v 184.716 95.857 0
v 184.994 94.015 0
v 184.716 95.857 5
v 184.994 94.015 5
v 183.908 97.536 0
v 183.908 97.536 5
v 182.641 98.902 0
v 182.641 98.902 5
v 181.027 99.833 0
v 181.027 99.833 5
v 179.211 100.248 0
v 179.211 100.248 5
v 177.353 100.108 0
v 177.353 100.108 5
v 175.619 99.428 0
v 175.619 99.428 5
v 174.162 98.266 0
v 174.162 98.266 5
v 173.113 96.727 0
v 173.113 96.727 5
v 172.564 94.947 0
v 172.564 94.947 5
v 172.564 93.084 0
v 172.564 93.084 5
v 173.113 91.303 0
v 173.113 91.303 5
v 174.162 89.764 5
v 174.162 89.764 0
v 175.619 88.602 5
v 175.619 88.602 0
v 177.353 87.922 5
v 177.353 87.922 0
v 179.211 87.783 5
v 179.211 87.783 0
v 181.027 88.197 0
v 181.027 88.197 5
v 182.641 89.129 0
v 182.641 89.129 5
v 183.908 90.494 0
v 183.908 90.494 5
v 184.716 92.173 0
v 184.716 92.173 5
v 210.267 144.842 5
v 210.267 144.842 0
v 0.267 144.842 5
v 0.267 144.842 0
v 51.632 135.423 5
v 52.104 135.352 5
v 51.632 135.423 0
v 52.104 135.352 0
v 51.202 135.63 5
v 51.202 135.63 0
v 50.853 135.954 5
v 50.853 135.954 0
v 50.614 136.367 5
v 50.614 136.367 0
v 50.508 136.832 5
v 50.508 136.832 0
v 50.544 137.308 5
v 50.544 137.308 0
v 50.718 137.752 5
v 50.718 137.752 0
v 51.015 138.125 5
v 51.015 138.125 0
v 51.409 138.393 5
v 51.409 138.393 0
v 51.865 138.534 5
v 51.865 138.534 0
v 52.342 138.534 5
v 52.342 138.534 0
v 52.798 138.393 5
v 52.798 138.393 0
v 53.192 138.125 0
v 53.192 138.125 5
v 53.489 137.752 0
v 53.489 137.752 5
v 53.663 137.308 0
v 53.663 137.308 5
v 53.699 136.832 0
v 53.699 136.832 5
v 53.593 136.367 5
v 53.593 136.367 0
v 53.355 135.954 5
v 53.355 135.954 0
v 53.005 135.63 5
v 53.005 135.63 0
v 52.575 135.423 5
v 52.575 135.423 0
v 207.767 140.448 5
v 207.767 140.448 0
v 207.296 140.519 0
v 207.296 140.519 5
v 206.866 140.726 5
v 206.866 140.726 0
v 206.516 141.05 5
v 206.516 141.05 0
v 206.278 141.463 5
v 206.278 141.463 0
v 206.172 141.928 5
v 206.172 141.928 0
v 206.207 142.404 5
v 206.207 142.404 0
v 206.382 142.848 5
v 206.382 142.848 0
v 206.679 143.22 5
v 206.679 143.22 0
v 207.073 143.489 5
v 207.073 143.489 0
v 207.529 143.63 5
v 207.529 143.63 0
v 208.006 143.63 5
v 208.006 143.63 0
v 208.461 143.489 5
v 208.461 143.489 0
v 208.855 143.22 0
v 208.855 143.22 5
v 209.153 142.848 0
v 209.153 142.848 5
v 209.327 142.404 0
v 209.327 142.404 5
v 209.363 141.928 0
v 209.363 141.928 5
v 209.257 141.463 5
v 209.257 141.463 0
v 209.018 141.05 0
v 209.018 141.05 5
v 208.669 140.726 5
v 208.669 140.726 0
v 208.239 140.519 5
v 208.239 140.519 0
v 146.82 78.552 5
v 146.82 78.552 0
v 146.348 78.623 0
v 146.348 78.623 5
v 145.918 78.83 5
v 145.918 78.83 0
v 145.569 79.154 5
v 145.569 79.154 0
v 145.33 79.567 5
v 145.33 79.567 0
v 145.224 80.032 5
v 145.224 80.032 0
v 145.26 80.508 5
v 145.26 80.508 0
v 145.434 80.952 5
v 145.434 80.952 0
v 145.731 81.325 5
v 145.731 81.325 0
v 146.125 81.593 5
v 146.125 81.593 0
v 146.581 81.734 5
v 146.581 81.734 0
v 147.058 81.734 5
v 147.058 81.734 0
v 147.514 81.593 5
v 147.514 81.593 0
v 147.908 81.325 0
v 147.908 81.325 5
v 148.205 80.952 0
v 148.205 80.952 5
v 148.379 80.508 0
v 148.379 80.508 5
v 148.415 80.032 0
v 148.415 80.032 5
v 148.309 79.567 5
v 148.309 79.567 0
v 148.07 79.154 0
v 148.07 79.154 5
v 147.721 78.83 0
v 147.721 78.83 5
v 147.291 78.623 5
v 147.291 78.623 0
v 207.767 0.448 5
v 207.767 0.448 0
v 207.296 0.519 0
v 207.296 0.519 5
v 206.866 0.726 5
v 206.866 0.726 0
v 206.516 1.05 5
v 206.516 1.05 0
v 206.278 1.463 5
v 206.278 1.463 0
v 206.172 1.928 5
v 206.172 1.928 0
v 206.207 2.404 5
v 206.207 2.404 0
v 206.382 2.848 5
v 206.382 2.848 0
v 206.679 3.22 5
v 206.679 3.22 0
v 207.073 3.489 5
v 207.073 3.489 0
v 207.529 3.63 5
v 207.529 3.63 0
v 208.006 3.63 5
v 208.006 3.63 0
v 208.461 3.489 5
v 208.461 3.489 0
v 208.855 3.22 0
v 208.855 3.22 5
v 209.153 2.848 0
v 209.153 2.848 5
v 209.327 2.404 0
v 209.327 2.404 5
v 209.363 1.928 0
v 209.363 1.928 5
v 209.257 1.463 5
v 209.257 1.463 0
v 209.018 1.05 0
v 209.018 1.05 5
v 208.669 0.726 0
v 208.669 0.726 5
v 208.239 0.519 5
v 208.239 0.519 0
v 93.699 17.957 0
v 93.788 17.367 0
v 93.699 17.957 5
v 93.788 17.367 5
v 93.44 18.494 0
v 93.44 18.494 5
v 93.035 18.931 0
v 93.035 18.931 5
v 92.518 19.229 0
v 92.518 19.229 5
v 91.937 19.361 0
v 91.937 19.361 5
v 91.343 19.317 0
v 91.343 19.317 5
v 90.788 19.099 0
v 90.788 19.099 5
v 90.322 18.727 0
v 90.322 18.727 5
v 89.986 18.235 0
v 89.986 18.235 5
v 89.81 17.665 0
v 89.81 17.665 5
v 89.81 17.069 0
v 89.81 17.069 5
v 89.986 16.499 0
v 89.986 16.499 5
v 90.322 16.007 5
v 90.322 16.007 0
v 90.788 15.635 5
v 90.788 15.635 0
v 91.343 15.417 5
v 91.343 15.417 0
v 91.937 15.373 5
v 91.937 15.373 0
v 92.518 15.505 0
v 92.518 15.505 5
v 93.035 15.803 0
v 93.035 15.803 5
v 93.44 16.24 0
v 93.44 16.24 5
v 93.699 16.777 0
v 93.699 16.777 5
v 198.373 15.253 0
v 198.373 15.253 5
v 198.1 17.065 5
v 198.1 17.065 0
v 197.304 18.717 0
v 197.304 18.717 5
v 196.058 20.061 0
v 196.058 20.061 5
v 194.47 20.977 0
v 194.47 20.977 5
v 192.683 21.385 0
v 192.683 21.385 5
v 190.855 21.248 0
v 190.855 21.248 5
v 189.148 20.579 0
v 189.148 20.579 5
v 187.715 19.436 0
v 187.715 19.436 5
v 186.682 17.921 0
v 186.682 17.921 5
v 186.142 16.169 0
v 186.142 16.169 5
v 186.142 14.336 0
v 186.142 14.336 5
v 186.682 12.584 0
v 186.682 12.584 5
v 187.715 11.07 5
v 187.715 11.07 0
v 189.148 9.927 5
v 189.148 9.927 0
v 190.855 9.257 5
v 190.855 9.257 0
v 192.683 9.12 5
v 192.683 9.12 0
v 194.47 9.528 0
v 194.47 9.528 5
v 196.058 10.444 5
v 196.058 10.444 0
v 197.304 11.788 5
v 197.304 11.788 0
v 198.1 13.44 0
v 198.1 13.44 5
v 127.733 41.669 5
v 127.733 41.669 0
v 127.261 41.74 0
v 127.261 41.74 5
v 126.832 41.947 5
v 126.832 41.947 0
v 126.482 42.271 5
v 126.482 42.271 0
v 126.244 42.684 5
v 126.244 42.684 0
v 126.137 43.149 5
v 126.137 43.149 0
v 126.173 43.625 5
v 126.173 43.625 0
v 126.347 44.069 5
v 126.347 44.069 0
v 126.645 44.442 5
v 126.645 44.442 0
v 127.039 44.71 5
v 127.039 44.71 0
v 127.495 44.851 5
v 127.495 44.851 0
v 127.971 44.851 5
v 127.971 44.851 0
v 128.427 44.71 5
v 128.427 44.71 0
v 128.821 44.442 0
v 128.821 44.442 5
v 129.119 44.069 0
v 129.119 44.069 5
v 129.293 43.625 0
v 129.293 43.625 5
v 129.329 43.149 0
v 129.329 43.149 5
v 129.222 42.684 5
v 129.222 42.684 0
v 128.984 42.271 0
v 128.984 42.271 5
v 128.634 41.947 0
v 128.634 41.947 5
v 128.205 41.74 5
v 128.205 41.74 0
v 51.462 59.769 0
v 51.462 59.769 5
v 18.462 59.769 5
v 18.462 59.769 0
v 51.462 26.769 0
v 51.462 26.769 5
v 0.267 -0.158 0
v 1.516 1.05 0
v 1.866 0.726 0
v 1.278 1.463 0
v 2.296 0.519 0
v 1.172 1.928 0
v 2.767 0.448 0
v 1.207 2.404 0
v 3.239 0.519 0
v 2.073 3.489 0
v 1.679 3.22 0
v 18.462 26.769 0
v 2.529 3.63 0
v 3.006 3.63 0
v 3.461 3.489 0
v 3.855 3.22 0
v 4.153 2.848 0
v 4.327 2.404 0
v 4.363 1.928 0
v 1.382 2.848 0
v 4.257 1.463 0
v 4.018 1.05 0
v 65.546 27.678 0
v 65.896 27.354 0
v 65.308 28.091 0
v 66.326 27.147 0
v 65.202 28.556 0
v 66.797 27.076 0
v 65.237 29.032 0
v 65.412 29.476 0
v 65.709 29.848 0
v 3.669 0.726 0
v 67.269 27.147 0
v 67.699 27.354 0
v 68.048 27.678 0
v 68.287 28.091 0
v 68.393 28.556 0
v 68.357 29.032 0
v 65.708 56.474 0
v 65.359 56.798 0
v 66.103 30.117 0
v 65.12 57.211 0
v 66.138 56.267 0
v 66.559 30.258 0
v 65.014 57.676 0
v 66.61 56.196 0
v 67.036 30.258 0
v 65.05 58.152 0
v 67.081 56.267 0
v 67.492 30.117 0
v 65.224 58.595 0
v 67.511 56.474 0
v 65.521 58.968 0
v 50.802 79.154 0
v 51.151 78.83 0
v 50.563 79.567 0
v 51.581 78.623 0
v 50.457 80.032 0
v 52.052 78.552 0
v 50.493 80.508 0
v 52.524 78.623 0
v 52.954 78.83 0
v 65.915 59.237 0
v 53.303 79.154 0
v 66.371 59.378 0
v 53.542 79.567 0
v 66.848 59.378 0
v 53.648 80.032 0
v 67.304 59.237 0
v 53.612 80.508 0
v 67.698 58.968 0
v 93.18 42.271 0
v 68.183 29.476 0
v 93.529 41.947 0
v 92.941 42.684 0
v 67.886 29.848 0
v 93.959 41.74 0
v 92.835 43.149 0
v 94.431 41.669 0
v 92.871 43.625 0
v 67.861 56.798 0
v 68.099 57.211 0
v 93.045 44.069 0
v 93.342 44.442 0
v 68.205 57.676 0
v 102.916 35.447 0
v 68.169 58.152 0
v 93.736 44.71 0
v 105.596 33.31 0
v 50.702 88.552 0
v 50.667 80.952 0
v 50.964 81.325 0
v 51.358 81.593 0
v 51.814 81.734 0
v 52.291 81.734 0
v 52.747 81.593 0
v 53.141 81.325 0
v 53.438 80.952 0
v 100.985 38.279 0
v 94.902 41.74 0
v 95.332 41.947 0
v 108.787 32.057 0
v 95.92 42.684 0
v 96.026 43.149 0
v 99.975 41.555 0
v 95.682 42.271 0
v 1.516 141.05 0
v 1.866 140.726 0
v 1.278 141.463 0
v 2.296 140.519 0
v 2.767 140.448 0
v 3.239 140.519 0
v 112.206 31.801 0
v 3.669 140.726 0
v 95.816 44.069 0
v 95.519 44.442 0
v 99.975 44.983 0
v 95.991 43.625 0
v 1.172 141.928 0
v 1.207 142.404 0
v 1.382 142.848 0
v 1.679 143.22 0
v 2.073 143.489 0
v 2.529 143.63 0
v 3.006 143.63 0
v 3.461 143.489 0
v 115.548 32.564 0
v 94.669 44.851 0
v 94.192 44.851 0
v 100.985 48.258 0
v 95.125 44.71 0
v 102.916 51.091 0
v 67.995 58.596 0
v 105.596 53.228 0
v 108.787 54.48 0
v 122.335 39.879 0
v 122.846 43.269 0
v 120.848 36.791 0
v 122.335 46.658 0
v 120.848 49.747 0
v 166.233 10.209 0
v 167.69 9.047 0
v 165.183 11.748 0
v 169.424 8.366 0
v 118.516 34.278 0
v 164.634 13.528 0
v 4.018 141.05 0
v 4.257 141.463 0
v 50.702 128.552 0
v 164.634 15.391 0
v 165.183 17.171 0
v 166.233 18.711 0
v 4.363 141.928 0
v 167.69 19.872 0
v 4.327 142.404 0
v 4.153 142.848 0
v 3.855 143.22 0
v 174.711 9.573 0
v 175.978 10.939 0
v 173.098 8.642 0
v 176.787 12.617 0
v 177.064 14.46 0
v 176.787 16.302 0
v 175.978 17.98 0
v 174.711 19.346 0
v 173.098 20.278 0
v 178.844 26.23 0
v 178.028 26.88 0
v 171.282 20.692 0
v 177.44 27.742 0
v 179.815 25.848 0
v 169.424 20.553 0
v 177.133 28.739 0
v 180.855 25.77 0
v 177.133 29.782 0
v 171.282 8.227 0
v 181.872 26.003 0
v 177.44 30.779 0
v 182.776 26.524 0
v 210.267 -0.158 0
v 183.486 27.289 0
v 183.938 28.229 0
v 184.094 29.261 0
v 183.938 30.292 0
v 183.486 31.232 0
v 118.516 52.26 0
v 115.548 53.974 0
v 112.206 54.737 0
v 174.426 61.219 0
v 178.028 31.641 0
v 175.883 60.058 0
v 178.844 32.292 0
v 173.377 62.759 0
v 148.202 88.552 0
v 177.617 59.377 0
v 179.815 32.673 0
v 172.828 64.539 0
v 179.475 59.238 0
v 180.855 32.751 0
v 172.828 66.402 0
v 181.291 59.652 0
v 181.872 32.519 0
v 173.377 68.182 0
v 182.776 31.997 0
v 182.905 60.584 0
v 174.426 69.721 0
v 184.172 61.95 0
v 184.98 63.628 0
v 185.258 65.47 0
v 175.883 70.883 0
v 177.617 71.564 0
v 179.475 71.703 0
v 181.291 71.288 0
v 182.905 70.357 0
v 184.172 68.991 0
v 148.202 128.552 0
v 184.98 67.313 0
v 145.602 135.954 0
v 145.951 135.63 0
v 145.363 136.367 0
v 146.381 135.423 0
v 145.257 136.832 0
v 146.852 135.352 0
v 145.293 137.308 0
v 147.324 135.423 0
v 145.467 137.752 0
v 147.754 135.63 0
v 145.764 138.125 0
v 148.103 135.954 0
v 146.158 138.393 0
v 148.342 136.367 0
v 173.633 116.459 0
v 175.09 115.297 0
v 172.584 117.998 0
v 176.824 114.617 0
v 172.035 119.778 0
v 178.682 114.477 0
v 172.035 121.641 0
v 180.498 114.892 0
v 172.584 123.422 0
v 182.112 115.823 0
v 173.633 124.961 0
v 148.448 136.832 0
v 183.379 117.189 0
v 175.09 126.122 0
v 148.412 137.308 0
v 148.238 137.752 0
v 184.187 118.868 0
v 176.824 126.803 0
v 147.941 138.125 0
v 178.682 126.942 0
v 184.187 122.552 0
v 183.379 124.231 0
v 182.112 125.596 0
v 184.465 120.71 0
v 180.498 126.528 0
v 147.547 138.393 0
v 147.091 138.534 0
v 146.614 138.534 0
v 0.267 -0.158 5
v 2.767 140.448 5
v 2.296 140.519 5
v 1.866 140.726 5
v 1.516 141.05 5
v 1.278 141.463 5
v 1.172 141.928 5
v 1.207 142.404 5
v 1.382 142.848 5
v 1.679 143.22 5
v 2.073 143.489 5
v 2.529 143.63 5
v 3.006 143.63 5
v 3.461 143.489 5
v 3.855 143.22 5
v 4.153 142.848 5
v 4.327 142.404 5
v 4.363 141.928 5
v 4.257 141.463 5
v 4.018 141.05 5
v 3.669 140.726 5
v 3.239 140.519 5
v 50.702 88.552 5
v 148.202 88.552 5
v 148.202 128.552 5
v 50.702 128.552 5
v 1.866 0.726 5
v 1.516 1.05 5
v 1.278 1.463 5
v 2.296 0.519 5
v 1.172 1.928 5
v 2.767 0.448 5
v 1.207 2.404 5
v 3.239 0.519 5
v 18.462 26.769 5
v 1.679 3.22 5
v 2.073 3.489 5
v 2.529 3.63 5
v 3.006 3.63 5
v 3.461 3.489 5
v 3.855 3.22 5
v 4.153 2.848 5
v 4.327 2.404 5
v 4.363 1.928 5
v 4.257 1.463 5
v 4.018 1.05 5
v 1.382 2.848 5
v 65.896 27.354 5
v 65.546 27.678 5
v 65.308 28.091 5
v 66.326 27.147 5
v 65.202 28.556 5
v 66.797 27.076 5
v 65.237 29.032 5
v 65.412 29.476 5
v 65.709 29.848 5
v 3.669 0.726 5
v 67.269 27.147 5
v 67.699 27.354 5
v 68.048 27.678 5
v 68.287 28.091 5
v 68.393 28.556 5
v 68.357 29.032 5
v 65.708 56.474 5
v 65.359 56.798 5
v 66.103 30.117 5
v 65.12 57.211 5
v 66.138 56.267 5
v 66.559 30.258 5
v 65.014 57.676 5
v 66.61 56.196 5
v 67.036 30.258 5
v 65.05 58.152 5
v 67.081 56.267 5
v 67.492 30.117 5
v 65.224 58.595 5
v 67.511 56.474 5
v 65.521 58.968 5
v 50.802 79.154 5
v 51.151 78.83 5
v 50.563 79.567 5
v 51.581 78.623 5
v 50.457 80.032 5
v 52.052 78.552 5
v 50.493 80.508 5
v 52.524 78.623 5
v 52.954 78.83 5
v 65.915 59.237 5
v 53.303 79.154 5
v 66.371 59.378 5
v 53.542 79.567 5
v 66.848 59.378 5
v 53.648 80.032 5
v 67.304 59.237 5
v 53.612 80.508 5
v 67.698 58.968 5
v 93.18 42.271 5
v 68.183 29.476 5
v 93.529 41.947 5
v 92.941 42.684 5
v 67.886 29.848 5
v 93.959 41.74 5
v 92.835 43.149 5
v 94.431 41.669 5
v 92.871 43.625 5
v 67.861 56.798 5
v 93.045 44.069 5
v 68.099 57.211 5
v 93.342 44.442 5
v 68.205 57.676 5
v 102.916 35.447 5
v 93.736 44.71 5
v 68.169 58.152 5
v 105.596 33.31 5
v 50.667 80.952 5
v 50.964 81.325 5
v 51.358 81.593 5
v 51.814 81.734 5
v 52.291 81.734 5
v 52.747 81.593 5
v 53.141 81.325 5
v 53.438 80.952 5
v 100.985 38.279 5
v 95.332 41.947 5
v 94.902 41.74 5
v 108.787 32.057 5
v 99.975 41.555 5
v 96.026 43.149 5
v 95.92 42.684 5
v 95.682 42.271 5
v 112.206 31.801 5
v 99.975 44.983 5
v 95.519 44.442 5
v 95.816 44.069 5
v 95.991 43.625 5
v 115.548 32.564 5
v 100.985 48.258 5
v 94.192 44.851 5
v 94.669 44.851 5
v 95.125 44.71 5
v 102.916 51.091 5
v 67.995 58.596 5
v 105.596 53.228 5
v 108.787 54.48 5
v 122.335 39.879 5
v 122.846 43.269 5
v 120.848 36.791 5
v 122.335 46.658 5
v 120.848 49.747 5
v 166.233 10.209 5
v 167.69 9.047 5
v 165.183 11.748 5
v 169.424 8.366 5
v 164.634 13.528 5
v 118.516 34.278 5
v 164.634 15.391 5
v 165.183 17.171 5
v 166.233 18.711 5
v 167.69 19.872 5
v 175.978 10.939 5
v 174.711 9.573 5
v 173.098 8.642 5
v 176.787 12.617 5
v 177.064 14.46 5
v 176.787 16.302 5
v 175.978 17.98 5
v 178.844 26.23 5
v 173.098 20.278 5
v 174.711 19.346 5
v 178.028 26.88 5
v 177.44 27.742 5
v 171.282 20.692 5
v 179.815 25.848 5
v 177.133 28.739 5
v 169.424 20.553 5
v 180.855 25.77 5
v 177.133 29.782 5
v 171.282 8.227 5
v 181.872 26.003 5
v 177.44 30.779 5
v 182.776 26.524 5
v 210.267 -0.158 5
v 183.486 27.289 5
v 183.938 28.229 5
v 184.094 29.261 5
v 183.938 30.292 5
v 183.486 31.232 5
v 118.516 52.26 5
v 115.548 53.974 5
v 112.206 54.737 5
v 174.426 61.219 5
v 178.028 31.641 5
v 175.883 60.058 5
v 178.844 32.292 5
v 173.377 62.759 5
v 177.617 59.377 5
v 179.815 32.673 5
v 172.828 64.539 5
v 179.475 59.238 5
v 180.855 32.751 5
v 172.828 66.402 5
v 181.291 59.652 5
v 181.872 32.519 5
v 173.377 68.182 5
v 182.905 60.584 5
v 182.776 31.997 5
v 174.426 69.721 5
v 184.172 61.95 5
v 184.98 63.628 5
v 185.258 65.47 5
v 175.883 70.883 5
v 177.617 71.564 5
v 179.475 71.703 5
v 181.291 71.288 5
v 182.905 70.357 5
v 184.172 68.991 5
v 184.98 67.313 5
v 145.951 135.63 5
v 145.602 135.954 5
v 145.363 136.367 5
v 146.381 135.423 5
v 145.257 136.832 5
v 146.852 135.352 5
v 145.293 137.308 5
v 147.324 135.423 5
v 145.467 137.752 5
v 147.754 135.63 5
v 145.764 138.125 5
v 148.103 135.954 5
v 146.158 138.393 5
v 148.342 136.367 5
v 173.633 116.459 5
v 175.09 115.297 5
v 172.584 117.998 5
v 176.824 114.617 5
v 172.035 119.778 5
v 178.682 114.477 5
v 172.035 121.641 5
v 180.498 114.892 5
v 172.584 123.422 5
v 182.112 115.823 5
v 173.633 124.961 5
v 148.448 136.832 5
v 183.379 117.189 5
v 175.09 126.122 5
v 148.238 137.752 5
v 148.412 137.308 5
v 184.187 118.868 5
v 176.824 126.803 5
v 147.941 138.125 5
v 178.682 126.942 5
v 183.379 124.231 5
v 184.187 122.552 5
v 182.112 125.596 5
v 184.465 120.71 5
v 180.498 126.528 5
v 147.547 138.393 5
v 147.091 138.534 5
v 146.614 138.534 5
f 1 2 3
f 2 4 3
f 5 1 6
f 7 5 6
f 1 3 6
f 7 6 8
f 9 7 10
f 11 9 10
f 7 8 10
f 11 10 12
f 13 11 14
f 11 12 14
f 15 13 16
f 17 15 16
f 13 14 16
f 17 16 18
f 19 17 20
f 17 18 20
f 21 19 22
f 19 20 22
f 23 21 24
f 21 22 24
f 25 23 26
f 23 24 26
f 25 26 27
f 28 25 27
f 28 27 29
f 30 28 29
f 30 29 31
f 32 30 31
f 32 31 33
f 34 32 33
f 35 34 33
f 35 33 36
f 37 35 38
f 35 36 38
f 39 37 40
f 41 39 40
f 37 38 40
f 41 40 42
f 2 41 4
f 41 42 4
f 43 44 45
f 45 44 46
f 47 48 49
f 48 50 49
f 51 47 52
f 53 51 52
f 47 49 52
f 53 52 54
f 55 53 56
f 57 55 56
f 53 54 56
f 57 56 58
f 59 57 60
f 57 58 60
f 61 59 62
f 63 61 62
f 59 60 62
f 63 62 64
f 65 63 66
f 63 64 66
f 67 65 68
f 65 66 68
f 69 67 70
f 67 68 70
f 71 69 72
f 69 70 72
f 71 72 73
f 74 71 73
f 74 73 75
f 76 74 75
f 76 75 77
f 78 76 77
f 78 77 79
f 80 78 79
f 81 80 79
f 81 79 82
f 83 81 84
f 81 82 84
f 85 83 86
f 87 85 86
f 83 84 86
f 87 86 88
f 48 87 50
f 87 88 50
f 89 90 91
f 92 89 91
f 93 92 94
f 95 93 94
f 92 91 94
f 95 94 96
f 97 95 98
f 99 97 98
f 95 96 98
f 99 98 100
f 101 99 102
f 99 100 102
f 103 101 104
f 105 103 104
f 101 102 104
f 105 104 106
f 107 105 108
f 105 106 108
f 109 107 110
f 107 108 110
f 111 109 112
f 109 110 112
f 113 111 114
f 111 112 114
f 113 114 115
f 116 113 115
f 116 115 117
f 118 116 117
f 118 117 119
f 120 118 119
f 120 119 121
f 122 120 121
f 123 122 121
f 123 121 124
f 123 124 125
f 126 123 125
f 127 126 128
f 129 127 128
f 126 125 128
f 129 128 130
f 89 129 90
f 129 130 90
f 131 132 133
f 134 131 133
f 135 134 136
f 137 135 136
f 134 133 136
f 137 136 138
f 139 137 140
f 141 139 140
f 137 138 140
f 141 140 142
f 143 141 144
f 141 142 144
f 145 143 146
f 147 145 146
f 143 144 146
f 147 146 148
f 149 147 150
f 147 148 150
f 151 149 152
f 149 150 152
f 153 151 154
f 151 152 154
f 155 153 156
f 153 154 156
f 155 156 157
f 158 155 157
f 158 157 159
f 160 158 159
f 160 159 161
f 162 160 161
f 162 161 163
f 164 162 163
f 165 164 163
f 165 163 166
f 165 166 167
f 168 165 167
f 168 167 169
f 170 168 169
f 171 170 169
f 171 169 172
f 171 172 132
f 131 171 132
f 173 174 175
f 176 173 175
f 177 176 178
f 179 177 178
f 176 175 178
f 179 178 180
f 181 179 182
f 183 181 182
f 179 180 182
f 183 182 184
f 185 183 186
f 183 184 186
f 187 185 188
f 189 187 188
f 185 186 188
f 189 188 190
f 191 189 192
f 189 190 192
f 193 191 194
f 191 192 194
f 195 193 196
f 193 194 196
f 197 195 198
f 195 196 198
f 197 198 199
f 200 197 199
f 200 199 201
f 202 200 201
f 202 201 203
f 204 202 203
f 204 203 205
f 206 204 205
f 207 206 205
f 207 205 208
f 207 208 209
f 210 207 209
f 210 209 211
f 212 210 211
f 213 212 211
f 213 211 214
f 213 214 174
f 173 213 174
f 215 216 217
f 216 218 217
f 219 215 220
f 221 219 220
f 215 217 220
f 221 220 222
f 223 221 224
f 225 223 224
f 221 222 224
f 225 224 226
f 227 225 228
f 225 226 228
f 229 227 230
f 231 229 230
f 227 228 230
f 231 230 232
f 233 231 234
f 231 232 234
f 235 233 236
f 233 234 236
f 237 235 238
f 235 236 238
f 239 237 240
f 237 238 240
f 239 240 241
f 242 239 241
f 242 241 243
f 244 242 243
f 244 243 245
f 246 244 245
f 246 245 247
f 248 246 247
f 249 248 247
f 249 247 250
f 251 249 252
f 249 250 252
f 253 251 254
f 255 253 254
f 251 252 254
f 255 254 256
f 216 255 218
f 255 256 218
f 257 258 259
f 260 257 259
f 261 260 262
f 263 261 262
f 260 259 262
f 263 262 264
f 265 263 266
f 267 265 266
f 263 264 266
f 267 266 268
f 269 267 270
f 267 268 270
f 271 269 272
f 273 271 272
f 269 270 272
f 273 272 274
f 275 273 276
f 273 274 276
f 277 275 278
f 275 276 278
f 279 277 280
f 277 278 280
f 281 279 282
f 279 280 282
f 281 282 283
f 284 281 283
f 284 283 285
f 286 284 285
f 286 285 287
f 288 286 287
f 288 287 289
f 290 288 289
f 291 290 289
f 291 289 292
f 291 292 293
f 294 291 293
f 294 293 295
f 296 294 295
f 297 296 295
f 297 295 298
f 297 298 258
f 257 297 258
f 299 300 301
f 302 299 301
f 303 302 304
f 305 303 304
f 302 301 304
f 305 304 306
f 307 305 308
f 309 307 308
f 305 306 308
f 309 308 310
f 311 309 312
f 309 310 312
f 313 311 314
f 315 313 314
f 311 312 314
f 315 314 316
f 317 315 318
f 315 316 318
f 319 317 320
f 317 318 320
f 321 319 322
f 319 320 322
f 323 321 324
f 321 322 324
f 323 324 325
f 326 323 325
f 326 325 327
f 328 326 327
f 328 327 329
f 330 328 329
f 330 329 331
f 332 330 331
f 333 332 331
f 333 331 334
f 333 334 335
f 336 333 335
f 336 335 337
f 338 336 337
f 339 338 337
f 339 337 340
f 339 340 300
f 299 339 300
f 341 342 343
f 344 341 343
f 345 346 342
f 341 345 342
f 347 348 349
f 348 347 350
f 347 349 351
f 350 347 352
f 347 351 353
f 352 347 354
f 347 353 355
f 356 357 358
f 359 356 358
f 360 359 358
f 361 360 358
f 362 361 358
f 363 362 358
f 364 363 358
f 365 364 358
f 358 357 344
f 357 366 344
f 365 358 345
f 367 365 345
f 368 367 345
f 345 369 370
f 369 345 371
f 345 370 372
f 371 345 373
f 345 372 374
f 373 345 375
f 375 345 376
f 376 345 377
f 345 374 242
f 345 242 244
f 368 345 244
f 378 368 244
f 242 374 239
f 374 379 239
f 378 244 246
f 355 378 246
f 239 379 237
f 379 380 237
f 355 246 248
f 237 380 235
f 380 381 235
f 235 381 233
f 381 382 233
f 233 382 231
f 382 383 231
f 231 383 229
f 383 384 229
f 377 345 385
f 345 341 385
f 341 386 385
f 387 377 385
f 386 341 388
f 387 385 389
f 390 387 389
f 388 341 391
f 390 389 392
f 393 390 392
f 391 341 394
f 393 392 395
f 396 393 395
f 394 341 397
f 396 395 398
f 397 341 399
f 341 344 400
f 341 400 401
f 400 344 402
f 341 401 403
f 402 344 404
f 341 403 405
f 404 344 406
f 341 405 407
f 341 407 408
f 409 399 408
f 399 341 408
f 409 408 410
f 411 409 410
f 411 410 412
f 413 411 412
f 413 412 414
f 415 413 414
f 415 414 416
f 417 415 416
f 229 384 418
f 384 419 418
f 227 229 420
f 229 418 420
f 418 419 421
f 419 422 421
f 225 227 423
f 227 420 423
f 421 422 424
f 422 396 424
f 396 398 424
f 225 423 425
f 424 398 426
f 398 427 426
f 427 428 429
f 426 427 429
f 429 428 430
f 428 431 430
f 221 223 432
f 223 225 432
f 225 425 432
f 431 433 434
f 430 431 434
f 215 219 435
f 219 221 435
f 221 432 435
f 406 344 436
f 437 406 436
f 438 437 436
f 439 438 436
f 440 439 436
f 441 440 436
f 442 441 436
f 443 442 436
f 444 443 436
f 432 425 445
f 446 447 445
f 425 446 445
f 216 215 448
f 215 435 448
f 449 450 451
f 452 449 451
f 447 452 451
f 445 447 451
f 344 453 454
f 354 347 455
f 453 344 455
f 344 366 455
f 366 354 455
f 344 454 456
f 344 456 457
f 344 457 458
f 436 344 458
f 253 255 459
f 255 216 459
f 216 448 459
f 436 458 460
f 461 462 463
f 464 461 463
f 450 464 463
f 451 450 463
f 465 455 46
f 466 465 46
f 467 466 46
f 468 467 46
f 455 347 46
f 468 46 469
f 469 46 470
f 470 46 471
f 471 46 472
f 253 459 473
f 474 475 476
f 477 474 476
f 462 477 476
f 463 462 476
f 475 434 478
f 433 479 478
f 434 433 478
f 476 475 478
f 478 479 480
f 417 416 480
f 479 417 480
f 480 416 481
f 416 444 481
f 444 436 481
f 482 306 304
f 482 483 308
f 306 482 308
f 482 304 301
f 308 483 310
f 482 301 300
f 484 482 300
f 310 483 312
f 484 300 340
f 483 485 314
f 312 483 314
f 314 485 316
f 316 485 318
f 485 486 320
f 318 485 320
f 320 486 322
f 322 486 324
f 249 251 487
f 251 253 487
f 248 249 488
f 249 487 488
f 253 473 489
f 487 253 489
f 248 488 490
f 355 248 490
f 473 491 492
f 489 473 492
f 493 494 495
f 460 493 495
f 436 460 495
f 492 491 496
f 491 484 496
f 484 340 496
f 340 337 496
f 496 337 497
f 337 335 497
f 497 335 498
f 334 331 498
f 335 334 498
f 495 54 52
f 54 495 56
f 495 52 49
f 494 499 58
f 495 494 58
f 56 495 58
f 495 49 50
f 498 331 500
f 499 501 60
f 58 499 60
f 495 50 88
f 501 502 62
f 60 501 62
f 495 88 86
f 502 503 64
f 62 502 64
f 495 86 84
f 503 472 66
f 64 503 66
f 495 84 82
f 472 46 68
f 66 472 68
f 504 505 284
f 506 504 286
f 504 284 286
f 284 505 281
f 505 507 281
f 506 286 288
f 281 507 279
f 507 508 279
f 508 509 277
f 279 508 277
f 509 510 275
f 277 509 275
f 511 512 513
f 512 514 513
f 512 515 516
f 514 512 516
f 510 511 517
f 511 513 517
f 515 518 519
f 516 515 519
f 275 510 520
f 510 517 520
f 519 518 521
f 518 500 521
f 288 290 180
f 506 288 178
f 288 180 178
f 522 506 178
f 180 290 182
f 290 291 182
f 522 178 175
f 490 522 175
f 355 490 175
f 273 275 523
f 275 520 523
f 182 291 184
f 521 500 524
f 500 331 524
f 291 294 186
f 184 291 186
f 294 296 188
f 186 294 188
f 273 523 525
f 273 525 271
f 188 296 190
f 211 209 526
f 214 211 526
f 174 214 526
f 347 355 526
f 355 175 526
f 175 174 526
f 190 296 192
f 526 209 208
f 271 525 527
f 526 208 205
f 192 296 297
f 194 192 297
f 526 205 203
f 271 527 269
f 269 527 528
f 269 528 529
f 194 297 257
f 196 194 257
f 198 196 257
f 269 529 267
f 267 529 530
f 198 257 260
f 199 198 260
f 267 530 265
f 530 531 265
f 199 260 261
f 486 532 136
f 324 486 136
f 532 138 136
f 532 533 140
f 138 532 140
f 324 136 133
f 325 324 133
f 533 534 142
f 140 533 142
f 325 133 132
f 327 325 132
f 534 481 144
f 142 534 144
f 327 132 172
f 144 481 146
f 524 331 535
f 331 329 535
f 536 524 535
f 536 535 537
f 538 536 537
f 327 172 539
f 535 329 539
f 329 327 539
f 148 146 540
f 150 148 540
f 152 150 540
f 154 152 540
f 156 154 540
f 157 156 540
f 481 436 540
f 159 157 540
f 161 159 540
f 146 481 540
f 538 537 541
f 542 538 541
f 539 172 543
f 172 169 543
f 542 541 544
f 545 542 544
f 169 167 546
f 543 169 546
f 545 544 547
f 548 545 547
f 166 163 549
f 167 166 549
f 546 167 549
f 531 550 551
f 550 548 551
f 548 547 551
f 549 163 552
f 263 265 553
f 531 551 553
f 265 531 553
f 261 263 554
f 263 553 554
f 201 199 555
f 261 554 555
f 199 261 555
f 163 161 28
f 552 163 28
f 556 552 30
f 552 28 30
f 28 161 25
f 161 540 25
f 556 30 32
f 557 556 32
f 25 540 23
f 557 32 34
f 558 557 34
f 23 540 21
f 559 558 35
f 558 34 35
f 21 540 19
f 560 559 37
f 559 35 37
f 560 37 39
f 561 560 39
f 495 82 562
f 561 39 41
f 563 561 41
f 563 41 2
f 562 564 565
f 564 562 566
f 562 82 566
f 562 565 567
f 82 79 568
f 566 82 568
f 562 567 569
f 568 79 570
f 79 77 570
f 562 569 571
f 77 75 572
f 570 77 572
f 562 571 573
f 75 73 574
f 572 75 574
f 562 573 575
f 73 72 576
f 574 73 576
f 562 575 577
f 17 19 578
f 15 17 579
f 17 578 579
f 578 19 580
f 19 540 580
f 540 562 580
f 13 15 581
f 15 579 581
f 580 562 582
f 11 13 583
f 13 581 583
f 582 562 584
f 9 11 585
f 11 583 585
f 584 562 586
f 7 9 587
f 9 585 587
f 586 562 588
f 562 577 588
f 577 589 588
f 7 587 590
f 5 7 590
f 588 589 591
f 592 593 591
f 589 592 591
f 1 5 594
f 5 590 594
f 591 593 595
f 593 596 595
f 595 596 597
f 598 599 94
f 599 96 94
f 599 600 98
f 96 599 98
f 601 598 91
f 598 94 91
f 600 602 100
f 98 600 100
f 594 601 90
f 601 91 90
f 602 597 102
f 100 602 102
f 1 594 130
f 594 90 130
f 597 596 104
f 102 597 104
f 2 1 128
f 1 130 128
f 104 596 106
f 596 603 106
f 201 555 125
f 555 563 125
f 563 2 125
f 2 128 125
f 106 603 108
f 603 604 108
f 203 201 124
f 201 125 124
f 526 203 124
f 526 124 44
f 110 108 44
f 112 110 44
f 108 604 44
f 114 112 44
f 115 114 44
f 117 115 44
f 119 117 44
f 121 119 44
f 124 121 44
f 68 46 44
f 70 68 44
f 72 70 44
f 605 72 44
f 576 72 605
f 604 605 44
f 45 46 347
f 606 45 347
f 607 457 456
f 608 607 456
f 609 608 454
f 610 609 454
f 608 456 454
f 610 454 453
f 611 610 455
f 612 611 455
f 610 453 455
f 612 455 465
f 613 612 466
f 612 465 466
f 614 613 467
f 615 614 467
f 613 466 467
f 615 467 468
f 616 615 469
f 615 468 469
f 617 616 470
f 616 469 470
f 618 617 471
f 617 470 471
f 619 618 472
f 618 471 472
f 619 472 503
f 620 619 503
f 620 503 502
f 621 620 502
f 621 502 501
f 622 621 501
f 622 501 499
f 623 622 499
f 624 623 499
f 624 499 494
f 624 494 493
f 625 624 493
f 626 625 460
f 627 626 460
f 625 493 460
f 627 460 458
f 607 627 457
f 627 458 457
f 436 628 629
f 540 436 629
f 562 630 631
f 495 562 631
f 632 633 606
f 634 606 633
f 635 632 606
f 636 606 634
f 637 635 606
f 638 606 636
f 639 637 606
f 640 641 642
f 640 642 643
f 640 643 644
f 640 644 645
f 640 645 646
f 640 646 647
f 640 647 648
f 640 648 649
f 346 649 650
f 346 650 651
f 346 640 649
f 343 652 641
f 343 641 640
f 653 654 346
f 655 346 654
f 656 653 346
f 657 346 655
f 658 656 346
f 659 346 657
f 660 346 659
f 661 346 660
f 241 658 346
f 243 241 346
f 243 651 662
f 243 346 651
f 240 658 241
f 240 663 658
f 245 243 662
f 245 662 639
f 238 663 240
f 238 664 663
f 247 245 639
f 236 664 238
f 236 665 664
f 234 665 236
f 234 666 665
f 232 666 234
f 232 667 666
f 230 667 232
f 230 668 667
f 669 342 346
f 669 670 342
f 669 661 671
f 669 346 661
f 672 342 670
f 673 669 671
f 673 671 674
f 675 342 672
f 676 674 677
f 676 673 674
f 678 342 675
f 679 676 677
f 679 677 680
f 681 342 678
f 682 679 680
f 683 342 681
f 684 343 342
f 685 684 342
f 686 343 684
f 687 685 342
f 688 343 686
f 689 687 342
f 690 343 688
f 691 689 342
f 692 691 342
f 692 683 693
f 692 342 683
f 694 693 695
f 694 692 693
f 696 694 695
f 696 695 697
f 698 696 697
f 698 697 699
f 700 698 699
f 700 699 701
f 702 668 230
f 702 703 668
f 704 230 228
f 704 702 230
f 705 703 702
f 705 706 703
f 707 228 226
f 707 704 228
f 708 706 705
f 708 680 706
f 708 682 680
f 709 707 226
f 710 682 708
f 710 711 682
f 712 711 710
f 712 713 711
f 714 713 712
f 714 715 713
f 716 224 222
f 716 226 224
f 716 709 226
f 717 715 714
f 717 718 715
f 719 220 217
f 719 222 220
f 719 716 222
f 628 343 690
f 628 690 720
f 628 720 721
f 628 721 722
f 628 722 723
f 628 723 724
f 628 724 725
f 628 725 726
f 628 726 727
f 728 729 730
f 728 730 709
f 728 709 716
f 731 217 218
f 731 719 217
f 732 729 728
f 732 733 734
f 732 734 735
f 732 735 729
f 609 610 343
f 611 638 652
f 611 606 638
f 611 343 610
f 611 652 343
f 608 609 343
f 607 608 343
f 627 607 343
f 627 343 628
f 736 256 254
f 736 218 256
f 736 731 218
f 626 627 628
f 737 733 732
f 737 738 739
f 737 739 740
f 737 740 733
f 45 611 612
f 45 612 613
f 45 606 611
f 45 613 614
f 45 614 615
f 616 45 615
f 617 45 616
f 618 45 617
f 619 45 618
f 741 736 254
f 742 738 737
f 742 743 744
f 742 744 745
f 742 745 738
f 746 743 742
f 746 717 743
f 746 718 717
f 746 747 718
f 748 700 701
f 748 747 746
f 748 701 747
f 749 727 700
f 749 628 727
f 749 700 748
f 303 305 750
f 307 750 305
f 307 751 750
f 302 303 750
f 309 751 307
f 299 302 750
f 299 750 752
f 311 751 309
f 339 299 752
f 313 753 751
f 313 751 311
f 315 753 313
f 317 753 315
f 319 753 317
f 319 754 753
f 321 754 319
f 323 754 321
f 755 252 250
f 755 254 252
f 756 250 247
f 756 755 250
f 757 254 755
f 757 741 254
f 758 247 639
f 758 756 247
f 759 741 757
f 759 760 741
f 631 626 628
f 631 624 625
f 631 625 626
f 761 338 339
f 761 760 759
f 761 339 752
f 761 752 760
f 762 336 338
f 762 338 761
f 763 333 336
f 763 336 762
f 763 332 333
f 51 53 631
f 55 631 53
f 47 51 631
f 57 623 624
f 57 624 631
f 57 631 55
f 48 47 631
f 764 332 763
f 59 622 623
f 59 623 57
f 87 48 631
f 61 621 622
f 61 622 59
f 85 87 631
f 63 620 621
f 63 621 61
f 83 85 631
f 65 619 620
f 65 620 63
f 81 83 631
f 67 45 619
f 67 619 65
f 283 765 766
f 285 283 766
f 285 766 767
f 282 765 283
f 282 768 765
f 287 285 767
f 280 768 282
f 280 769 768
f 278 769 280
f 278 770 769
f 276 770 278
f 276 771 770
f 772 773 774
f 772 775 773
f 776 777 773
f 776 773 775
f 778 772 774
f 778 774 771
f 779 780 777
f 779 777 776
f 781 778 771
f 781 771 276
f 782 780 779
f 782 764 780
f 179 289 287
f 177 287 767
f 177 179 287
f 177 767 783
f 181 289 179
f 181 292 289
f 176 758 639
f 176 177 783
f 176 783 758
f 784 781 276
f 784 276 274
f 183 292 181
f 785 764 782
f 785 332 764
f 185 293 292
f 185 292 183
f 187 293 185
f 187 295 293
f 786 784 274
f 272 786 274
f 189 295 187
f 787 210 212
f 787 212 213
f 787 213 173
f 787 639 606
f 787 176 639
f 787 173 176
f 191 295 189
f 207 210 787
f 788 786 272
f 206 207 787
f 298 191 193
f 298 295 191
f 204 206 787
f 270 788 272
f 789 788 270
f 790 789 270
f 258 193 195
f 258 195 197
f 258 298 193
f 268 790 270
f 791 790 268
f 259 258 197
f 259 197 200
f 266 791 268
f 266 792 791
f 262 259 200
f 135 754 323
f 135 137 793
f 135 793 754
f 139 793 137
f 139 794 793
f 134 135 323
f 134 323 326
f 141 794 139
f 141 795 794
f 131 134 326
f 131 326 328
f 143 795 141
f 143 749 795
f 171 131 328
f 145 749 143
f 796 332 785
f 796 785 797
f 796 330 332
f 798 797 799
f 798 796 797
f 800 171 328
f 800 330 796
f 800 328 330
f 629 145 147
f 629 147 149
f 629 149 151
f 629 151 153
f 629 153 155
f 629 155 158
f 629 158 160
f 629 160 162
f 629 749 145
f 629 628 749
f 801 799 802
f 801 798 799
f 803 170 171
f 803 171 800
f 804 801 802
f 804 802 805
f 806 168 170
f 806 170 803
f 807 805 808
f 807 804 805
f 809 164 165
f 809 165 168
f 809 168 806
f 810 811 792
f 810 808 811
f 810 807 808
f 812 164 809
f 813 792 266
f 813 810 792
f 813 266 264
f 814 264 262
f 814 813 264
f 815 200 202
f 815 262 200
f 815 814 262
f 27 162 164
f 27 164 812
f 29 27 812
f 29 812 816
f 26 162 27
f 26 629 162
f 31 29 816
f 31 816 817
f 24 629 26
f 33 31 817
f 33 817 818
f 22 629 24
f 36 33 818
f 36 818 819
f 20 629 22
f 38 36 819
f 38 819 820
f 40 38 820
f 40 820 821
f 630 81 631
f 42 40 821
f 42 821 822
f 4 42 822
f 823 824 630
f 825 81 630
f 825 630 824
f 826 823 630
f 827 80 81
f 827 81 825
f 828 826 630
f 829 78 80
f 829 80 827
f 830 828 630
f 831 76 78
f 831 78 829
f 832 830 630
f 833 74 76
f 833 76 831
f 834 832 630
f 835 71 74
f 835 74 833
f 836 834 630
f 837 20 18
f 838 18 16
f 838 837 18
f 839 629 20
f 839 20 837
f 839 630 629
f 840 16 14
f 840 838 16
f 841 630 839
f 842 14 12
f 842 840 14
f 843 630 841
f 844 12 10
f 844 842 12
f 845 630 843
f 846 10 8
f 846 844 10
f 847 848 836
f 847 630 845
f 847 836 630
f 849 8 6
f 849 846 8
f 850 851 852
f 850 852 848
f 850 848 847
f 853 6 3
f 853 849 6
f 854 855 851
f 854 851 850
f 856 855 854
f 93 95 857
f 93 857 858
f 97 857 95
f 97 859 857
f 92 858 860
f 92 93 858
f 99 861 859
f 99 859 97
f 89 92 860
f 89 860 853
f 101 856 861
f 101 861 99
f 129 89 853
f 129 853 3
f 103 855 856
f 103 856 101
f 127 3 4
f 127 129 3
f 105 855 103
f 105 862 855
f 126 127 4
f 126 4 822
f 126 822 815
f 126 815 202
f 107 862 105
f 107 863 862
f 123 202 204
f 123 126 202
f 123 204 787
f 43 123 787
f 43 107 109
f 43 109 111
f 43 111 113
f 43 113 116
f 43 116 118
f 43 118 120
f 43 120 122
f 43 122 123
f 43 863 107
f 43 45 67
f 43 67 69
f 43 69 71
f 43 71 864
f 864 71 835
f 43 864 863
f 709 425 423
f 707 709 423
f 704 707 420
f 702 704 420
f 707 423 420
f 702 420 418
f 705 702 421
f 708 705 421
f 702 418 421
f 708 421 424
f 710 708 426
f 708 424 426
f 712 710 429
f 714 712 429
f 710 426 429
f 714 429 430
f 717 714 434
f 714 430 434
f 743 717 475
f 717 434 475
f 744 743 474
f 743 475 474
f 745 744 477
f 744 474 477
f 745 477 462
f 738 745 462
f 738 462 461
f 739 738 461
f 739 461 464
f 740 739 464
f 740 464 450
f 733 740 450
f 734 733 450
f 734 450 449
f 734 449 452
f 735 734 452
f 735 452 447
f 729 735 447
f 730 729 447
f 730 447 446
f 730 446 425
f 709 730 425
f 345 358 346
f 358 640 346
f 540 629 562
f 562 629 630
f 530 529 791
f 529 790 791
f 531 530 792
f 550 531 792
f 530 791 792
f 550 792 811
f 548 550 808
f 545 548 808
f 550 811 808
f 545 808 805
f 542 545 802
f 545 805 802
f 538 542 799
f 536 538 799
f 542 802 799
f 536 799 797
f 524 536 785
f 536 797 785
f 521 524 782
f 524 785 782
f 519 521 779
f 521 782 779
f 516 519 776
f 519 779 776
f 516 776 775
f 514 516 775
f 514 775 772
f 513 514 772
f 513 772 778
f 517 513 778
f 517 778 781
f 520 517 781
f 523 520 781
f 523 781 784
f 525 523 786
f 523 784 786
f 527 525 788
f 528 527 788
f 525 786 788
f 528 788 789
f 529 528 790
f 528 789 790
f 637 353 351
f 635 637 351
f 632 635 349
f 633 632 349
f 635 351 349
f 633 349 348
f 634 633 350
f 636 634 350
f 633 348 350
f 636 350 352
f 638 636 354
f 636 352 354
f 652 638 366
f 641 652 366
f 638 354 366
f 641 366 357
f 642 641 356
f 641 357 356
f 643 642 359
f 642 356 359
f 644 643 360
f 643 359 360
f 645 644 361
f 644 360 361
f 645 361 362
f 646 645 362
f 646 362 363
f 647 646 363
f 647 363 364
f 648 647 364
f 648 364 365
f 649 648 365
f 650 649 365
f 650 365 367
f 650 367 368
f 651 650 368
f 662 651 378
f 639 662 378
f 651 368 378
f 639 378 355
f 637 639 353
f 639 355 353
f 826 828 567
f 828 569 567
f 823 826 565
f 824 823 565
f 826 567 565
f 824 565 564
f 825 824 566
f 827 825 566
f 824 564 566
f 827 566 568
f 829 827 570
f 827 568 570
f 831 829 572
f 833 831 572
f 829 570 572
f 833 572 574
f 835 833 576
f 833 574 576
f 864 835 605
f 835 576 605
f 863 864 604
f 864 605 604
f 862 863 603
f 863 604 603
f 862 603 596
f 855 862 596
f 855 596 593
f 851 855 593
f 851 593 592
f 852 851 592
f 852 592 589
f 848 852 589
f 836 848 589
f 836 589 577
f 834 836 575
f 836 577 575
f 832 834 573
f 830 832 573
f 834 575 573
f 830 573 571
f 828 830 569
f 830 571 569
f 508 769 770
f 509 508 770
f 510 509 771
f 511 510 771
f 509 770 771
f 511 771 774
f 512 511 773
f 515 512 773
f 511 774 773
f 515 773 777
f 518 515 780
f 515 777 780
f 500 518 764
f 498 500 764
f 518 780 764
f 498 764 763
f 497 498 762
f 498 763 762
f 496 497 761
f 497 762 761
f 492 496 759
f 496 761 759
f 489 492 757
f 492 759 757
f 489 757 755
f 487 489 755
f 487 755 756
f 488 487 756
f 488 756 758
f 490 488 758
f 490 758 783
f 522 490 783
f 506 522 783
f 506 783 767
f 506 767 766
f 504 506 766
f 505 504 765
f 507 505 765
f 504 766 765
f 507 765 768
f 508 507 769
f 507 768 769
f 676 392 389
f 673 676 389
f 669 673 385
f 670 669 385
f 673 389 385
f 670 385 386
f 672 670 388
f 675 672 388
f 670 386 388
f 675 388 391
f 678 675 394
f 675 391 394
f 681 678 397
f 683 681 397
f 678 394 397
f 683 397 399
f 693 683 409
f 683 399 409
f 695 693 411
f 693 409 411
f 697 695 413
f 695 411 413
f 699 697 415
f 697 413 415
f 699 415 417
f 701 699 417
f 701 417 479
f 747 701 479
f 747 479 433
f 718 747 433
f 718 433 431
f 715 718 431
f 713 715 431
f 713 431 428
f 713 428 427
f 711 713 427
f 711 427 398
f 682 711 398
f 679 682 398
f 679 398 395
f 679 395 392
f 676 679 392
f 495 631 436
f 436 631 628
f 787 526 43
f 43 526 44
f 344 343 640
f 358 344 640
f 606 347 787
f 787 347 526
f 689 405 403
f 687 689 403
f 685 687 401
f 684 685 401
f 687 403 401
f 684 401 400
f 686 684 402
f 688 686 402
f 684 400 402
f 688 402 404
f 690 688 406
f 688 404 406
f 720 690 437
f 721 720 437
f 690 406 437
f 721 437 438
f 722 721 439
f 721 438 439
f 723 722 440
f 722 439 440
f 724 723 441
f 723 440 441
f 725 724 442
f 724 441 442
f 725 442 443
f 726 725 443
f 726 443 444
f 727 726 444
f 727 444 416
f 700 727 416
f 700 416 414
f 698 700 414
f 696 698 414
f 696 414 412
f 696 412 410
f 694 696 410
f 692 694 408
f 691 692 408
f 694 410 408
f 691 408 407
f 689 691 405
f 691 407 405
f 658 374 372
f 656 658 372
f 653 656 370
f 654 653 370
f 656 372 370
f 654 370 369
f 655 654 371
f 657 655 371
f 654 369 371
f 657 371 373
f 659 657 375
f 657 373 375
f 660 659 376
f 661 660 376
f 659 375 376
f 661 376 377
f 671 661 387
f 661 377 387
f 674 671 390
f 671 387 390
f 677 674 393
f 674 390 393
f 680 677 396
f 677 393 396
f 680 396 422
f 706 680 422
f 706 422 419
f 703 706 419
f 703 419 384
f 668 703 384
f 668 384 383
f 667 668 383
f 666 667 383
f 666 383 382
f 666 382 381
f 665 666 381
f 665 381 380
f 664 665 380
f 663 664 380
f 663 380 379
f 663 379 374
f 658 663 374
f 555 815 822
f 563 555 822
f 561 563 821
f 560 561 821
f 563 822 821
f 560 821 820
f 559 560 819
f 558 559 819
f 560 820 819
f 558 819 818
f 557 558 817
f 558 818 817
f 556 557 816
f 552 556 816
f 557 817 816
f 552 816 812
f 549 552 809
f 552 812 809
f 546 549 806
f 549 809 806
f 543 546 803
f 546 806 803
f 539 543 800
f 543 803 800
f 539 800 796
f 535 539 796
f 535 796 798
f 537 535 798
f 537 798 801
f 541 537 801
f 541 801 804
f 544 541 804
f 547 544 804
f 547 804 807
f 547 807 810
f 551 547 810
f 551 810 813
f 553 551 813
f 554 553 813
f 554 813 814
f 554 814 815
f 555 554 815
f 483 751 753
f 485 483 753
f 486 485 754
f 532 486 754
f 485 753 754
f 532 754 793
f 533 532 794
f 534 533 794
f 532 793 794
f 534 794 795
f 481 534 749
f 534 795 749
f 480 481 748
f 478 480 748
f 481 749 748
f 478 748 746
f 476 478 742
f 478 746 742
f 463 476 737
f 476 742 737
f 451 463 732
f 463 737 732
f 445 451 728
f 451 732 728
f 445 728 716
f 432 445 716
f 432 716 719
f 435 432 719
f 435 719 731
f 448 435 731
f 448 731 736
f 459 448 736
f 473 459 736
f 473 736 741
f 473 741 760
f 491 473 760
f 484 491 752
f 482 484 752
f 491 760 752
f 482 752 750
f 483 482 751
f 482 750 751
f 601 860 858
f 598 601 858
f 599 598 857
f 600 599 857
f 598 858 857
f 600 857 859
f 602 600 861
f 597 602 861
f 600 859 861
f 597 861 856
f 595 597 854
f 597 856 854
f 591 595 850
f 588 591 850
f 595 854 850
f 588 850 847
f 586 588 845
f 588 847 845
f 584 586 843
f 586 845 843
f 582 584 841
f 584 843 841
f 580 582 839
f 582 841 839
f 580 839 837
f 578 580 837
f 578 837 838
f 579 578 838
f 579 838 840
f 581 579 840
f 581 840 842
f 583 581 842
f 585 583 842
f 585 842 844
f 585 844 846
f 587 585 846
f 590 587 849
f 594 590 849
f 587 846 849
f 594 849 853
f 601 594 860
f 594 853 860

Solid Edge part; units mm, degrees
sketch "Sketch1" plane through (0, 0, 0) normal (0, 0, 1) x (1, 0, 0)
  line L0 (210.2672, -0.1578) -> (210.2672, 144.8422)
  line L1 (210.2672, 144.8422) -> (0.2672, 144.8422)
  line L2 (0.2672, 144.8422) -> (0.2672, -0.1578)
  line L3 (0.2672, -0.1578) -> (210.2672, -0.1578)
extrude "Protrusion1" add sketch "Sketch1" along normal blind 5
hole "Hole_3" at (52.1036, 136.9518, 5) direction (0, 0, -1) diameter 3.2 depth 50.8
hole "Hole1" at (146.8525, 136.9518, 5) direction (0, 0, -1) diameter 3.2 depth 50.8
hole "Hole2" at (146.8195, 80.1518, 5) direction (0, 0, -1) diameter 3.2 depth 50.8
hole "Hole3" at (52.0525, 80.1518, 5) direction (0, 0, -1) diameter 3.2 depth 50.8
sketch "Sketch2" plane through (105.2672, 72.3422, 5) normal (0, 0, 1) x (1, 0, 0)
  line L0 (-54.5647, 16.2096) -> (42.9353, 16.2096)
  line L1 (42.9353, 16.2096) -> (42.9353, 56.2096)
  line L2 (42.9353, 56.2096) -> (-54.5647, 56.2096)
  line L3 (-54.5647, 56.2096) -> (-54.5647, 16.2096)
extrude "ExtrudedCutout_1" cut sketch "Sketch2" against normal blind 5
sketch "Sketch3" plane through (105.2672, 72.3422, 5) normal (0, 0, 1) x (1, 0, 0)
  circle A0 centre (86.9559, -57.0896) radius 6.15
extrude "ExtrudedCutout_2" cut sketch "Sketch3" against normal blind 5
sketch "Sketch4" plane through (105.2672, 72.3422, 5) normal (0, 0, 1) x (1, 0, 0)
  circle A0 centre (65.5473, -57.8825) radius 6.25
extrude "ExtrudedCutout_3" cut sketch "Sketch4" against normal blind 5
sketch "Sketch5" plane through (105.2672, 72.3422, 5) normal (0, 0, 1) x (1, 0, 0)
  circle A0 centre (75.3266, -43.0815) radius 3.5
extrude "ExtrudedCutout_4" cut sketch "Sketch5" against normal blind 5
hole "Hole_7" at (66.6096, 57.7955, 5) direction (0, 0, -1) diameter 3.2 depth 50.8
hole "Hole_8" at (66.7973, 28.6755, 5) direction (0, 0, -1) diameter 3.2 depth 50.8
sketch "Sketch6" plane through (105.2672, 72.3422, 5) normal (0, 0, 1) x (1, 0, 0)
  line L0 (-53.8048, -45.5734) -> (-53.8048, -12.5734)
  line L1 (-53.8048, -12.5734) -> (-86.8048, -12.5734)
  line L2 (-86.8048, -12.5734) -> (-86.8048, -45.5734)
  line L3 (-86.8048, -45.5734) -> (-53.8048, -45.5734)
extrude "ExtrudedCutout_5" cut sketch "Sketch6" against normal blind 5
sketch "Sketch7" plane through (105.2672, 72.3422, 5) normal (0, 0, 1) x (1, 0, 0)
  circle A0 centre (72.9478, 48.3676) radius 6.25
  circle A1 centre (72.9478, 48.3676) radius 6.25
  dimension "D1" = 12.5
  dimension "D2" = 12.5
  dimension "D3" = 12.5
  dimension "D4" = 12.5
  dimension "D5" = 12.5
  dimension "D6" = 12.5
extrude "ExtrudedCutout_6" cut sketch "Sketch7" against normal blind 5
sketch "Sketch8" plane through (105.2672, 72.3422, 5) normal (0, 0, 1) x (1, 0, 0)
  circle A0 centre (73.4765, 21.6729) radius 6.25
extrude "ExtrudedCutout_7" cut sketch "Sketch8" against normal blind 5
sketch "Sketch9" plane through (105.2672, 72.3422, 5) normal (0, 0, 1) x (1, 0, 0)
  circle A0 centre (73.7408, -6.8719) radius 6.25
extrude "ExtrudedCutout_8" cut sketch "Sketch9" against normal blind 5
sketch "Sketch10" plane through (105.2672, 72.3422, 5) normal (0, 0, 1) x (1, 0, 0)
  circle A0 centre (6.079, -29.0734) radius 11.5
extrude "ExtrudedCutout_10" cut sketch "Sketch10" against normal blind 5
sketch "Sketch11" plane through (105.2672, 72.3422, 5) normal (0, 0, 1) x (1, 0, 0)
  circle A0 centre (-13.4795, -54.9752) radius 2
extrude "ExtrudedCutout_11" cut sketch "Sketch11" against normal blind 5
hole "Hole_11" at (94.4307, 43.2688, 5) direction (0, 0, -1) diameter 3.2 depth 50.8
hole "Hole4" at (127.733, 43.2688, 5) direction (0, 0, -1) diameter 3.2 depth 50.8
hole "Hole_13" at (2.7672, 142.0476, 5) direction (0, 0, -1) diameter 3.2 depth 50.8
hole "Hole5" at (207.7672, 142.0476, 5) direction (0, 0, -1) diameter 3.2 depth 50.8
hole "Hole6" at (207.7672, 2.0476, 5) direction (0, 0, -1) diameter 3.2 depth 50.8
hole "Hole7" at (2.7672, 2.0476, 5) direction (0, 0, -1) diameter 3.2 depth 50.8
